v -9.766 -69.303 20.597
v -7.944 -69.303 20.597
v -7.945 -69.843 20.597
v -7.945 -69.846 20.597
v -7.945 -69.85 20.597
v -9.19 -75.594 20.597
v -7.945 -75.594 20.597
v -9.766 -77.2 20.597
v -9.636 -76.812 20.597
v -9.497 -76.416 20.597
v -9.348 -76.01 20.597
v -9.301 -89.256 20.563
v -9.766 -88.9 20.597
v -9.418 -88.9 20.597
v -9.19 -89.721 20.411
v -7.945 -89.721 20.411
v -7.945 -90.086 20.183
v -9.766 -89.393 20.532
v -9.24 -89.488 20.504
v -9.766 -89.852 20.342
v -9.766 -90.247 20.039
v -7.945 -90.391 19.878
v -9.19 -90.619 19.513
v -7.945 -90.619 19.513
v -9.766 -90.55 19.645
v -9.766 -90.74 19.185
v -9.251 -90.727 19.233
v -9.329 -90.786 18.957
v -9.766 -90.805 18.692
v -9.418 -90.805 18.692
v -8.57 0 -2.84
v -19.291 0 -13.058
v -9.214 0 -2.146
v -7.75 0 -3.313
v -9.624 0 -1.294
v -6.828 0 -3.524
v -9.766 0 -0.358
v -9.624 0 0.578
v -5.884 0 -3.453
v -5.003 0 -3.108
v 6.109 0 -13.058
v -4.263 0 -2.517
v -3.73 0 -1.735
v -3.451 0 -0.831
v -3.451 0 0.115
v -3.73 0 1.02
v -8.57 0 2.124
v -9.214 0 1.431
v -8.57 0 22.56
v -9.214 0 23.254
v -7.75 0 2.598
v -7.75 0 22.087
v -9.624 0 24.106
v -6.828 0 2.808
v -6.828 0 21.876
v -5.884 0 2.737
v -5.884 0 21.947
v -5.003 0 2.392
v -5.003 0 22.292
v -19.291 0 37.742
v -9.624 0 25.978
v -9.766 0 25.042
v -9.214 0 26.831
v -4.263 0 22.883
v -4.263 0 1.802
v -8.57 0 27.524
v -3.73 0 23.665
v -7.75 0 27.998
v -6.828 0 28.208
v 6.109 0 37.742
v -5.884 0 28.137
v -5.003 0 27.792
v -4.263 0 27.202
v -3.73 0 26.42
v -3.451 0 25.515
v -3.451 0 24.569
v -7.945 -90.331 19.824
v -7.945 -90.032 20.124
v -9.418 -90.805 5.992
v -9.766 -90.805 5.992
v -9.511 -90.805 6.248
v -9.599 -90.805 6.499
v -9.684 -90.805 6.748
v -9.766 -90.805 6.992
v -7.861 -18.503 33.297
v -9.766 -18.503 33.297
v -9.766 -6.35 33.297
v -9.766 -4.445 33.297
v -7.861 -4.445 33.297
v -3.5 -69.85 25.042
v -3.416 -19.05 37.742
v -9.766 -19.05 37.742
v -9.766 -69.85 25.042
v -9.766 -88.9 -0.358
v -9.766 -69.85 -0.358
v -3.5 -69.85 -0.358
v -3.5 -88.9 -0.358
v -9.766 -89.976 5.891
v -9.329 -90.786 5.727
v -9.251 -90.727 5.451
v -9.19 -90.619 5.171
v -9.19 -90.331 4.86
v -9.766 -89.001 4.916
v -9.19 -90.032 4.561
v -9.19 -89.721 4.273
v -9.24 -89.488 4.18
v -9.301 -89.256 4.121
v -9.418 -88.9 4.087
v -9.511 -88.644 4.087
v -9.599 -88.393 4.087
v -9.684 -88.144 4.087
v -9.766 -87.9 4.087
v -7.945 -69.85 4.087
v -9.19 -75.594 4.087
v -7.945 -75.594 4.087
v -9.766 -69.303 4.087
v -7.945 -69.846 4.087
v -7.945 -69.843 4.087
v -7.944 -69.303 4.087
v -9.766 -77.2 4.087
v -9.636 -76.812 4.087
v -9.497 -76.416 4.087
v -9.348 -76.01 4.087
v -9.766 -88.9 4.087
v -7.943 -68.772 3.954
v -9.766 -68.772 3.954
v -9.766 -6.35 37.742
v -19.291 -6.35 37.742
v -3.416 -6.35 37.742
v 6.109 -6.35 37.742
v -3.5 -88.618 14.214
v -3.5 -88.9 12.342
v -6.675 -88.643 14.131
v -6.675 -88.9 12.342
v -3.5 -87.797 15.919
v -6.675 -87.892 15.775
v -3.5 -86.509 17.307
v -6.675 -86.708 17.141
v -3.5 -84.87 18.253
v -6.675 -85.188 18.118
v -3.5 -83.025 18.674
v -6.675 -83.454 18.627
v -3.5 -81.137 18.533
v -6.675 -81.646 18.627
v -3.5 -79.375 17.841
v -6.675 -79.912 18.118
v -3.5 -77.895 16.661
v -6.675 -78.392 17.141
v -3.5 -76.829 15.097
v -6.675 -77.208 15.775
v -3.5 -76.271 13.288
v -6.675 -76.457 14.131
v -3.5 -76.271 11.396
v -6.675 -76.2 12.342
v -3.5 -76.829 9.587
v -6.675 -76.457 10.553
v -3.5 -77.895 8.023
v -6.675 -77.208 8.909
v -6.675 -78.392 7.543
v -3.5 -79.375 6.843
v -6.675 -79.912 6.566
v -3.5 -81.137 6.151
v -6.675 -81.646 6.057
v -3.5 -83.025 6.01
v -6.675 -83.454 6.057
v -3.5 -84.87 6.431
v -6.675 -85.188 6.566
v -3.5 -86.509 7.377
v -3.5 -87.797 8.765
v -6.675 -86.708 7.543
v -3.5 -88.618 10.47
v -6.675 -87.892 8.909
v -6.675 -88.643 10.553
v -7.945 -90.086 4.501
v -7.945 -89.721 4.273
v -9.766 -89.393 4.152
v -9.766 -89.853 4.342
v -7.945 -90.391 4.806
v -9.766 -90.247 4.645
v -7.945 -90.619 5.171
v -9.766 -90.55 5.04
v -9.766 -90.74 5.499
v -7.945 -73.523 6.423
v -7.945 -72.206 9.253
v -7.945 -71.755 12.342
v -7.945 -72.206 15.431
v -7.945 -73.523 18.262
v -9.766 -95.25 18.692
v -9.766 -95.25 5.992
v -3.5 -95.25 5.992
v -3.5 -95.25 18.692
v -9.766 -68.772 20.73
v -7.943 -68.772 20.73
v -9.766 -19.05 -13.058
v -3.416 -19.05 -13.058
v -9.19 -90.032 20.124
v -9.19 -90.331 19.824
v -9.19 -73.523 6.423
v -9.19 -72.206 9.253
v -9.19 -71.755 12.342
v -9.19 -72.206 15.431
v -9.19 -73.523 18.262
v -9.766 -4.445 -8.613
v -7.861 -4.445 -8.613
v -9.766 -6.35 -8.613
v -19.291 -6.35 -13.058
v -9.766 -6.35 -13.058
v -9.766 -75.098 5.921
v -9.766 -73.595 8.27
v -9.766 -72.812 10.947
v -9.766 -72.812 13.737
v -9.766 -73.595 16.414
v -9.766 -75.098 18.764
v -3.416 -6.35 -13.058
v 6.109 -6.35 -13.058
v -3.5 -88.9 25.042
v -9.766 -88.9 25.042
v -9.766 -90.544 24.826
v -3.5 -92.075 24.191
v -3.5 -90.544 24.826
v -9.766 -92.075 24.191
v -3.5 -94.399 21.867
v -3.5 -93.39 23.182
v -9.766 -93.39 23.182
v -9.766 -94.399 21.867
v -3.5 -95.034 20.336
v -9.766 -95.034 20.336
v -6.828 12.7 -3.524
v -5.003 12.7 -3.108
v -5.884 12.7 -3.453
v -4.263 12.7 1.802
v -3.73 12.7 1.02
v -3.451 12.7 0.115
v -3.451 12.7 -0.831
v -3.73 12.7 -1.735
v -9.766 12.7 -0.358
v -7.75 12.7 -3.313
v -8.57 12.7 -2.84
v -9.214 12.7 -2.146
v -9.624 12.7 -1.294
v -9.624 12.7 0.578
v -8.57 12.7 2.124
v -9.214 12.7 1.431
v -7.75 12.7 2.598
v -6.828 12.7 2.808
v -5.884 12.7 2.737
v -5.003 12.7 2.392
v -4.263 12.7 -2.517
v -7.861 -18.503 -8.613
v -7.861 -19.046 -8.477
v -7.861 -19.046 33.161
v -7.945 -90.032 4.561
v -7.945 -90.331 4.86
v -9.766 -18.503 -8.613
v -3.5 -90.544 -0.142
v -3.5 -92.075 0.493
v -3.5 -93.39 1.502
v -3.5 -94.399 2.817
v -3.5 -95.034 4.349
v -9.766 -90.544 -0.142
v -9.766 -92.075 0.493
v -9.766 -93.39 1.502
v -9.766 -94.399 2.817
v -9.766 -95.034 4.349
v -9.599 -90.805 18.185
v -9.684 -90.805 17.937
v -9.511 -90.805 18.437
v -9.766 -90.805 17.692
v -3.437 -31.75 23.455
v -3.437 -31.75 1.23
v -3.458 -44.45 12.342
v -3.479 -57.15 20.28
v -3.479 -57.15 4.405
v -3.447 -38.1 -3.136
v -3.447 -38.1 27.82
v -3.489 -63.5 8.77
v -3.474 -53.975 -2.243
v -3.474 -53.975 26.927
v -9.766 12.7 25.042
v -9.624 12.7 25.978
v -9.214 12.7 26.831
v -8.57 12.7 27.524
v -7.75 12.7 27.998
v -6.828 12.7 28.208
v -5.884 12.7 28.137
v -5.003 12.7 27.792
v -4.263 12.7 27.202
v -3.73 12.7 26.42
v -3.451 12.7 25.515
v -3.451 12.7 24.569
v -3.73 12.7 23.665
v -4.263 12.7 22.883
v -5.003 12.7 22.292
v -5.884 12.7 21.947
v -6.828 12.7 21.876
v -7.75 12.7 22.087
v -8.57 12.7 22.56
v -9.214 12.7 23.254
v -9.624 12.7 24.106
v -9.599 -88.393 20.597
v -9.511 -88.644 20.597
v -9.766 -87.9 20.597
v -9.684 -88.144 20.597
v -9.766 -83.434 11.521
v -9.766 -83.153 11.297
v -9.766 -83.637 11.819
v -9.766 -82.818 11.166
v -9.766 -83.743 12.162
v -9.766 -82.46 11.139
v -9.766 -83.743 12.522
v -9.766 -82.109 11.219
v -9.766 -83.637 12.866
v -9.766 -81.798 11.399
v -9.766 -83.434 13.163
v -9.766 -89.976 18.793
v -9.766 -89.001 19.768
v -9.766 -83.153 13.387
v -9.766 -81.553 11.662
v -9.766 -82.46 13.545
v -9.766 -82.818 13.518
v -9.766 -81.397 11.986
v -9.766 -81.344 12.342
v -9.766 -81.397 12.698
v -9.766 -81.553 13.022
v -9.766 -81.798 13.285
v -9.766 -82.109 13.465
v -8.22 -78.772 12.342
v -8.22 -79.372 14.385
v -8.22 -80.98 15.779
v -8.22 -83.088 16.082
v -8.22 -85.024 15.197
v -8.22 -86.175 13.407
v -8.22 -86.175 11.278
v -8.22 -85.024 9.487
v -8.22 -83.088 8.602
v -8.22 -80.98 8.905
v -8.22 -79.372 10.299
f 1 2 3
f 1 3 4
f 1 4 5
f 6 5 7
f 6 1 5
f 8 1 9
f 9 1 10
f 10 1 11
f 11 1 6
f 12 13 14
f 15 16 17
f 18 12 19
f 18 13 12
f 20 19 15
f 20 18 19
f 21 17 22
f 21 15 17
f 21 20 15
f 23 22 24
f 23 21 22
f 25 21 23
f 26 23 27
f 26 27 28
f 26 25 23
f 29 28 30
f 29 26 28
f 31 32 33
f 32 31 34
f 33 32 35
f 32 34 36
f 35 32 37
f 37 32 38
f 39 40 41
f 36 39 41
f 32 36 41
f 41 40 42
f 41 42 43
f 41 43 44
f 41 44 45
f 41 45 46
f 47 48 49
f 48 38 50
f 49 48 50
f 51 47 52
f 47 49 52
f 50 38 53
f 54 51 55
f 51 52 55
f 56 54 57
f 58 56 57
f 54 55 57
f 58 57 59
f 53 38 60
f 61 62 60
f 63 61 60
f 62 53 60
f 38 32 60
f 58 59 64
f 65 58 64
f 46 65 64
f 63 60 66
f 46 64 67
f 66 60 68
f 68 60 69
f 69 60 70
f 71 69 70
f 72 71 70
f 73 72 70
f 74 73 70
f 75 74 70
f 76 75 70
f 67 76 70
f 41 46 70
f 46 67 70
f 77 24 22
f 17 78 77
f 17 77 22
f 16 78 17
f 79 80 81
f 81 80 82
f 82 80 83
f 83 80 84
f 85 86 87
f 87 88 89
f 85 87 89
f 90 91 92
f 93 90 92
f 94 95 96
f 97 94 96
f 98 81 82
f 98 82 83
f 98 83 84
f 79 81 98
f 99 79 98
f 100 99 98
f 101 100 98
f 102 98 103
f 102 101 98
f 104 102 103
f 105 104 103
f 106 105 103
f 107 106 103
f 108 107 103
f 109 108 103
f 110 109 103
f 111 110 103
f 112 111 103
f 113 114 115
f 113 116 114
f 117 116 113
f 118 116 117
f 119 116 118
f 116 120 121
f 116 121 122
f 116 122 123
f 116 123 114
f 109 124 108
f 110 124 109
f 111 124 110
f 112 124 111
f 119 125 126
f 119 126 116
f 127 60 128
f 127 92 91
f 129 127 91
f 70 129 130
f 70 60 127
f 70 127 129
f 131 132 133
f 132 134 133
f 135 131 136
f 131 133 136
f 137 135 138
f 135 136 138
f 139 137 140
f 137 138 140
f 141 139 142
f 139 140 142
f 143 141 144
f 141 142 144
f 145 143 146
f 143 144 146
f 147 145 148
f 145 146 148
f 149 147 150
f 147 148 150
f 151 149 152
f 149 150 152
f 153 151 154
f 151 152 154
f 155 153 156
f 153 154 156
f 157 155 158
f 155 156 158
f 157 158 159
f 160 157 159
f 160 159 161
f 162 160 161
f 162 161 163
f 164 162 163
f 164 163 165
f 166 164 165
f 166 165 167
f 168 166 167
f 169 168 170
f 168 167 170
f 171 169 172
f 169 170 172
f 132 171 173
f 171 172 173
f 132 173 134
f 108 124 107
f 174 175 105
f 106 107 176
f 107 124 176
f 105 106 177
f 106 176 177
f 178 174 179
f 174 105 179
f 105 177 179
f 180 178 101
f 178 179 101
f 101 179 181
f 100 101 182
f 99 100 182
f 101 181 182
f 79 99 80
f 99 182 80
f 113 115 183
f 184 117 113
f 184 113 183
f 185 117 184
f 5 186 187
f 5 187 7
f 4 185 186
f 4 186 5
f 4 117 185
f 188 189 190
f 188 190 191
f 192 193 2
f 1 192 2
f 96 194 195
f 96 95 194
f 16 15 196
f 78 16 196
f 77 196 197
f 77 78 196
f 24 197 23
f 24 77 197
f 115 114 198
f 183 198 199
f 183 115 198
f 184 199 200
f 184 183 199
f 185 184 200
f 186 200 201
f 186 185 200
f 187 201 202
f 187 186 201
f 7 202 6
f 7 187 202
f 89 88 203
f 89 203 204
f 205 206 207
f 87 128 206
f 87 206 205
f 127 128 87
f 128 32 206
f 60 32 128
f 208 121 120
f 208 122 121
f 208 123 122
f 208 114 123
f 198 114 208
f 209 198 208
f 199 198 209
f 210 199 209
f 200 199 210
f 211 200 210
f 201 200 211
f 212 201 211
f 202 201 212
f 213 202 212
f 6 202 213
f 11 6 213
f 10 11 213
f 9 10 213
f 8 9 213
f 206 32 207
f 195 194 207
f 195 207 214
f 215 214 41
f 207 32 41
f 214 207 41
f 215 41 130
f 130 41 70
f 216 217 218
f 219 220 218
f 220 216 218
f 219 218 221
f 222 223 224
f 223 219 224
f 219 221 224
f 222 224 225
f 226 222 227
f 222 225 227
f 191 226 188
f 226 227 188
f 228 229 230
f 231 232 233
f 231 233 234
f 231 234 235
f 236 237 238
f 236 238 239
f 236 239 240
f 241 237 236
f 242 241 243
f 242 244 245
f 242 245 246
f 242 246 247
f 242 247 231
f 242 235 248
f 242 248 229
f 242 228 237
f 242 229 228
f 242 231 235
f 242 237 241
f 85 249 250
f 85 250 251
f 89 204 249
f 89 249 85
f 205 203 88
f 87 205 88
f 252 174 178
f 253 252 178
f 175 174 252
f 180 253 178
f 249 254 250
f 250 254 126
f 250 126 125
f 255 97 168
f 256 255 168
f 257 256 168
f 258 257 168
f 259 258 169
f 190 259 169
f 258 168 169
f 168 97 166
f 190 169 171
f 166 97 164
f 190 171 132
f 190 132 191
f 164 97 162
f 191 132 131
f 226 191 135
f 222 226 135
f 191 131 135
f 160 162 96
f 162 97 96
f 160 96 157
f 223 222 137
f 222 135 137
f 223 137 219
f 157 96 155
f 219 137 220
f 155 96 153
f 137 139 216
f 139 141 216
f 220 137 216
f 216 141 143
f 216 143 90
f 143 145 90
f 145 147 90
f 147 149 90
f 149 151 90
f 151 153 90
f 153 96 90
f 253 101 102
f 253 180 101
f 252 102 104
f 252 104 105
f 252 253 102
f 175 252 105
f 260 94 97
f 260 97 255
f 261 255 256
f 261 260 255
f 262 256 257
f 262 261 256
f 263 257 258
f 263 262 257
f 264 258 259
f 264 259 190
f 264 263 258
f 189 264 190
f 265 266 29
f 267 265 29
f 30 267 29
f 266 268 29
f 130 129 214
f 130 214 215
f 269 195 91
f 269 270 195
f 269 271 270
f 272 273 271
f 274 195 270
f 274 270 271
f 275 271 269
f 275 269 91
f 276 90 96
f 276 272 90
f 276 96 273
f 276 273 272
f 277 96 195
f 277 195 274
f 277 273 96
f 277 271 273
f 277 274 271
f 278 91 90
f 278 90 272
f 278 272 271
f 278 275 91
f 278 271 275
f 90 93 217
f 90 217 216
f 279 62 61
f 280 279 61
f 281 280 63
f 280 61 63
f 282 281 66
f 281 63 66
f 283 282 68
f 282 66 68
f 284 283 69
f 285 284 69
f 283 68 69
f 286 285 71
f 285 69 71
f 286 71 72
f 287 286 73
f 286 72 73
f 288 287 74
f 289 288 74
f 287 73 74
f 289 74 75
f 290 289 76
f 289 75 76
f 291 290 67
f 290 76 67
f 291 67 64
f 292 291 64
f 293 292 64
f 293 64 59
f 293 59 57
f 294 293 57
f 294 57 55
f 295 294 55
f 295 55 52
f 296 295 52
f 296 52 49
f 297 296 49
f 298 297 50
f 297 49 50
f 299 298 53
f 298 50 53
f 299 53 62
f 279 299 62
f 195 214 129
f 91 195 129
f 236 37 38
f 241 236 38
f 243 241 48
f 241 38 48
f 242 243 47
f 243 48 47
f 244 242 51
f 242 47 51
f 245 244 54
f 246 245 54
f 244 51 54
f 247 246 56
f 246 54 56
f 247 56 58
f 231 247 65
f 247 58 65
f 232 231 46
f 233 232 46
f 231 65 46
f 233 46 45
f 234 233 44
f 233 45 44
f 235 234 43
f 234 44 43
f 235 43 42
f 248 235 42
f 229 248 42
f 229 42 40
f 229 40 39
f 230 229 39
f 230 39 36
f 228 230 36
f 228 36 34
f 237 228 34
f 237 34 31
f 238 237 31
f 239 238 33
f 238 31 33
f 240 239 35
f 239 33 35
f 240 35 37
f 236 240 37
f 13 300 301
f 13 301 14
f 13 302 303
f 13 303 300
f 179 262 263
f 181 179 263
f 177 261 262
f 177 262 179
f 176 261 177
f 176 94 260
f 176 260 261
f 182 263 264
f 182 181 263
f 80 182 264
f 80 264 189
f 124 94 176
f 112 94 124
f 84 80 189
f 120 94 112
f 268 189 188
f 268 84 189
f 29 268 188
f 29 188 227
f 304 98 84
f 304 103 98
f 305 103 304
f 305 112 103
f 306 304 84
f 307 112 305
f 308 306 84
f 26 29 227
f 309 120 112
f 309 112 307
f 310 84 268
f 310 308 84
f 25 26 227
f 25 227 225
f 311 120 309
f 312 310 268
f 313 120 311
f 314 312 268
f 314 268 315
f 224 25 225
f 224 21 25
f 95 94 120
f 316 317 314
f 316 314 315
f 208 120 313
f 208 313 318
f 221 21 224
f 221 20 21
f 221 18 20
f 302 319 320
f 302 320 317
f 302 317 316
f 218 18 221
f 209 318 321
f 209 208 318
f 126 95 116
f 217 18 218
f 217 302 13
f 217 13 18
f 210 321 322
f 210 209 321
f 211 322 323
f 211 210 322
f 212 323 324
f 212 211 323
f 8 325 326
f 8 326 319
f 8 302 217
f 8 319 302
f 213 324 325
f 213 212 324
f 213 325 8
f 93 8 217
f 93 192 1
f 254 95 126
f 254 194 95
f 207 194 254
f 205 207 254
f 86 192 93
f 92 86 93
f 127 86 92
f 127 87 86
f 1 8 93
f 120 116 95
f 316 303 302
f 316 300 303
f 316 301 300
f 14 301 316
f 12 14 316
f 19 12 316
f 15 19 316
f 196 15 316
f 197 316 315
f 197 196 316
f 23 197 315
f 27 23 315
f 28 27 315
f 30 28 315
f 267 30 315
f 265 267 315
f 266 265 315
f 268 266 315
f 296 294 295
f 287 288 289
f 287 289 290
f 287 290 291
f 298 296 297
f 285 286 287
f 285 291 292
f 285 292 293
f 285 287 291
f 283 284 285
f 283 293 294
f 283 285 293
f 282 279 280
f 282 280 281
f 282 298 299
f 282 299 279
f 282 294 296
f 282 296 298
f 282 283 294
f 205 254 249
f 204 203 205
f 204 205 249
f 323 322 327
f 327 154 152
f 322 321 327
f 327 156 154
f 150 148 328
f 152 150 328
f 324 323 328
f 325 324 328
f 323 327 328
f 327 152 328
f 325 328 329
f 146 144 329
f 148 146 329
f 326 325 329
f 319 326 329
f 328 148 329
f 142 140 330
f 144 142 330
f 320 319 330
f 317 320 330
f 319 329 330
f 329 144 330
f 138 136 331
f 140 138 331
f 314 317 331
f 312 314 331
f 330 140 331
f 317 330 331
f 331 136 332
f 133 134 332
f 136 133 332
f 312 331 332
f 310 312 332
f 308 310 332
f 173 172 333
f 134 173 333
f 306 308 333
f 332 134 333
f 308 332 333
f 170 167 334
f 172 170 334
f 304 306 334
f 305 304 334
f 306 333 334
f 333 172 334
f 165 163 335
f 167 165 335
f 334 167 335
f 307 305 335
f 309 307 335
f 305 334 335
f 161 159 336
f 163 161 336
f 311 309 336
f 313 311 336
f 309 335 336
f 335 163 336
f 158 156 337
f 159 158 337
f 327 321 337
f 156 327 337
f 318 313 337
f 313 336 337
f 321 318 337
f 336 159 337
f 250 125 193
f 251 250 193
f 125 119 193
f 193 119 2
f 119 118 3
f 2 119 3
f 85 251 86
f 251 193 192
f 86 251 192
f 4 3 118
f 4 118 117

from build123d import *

# Parameters (mm, degrees)
F0_W         = 25.4
F0_H         = 50.8
F1_DEPTH     = 6.35
F2_W         = 6.35
F2_H         = 50.8
F3_DEPTH     = 12.7
F3_FACE_W    = 6.35
F3_FACE_H    = 50.8
F5_W         = 6.2655590393
F5_H         = 25.4
F7_DEPTH     = 25.4
F8_T1_DEPTH  = 38.0155590393
F10_D        = 12.7
F10_DEPTH    = 3.175
F10_TIP      = 3.8154649308
F11_T        = 4.445
F11_T3_DEPTH = 59.69
F11_T5_DEPTH = 15.1555590393
F11_T7_DEPTH = 34.29
F12_R        = 3.175
F13_DEPTH    = 12.7


# Not quite as in the source:
# - a fillet or chamfer that OpenCascade refuses, or shapes differently, is made with other operations: its cross-section is extruded or revolved along the edge and cut away or added
# - a shell that OpenCascade refuses in one call is made with other operations: the cavity is built on its own and cut out


with BuildPart() as f1:
    # F0 (on Front) → F1 (new body)
    with BuildSketch(Plane.XZ):
        with Locations((-6.5905367956, 12.3420813114)):
            Rectangle(F0_W, F0_H)
    extrude(amount=F1_DEPTH)

    # F2 (on face) → F3 (join)
    with BuildSketch(Plane.XZ.offset(6.35)):
        with Locations((-6.5905367956, 12.3420813114)):
            Rectangle(F2_W, F2_H)
    extrude(amount=F3_DEPTH)

    # F3_face (on face) → F6 section 0
    with BuildSketch(Plane(origin=(-6.5905367956, -19.05, 12.3420813114), x_dir=(1, 0, 0), z_dir=(0, -1, 0))):
        Rectangle(F3_FACE_W, F3_FACE_H)
    # F5 (on offset) → F6 section 1
    with BuildSketch(Plane.XZ.offset(69.85)):
        with Locations((-6.6327572759, 12.3420813114)):
            Rectangle(F5_W, F5_H)
    loft()

    # F7 (add): a face of the model
    f7_faces = [f1.faces().sort_by_distance(p)[0] for p in [
        (-6.6327572759, -69.85, 12.3420813114),
    ]]
    extrude(f7_faces, amount=F7_DEPTH)

    # F8: fillet of radius 6.35 on 4 edges, made by hand

    # F8_s2 → F8_t1 (cut)
    with BuildSketch(Plane.YZ.offset(-25.6405367956)):
        with BuildLine():
            ThreePointArc((-88.9, 25.0420813114), (-93.3901280605, 23.1822093719), (-95.25, 18.6920813114))
            Line((-95.25, 18.6920813114), (-95.25, 25.0420813114))
            Line((-95.25, 25.0420813114), (-88.9, 25.0420813114))
        make_face()
        with BuildLine():
            ThreePointArc((-88.9, -0.3579186886), (-93.3901280605, 1.5019532508), (-95.25, 5.9920813114))
            Line((-95.25, 5.9920813114), (-95.25, -0.3579186886))
            Line((-95.25, -0.3579186886), (-88.9, -0.3579186886))
        make_face()
    extrude(amount=F8_T1_DEPTH, mode=Mode.SUBTRACT)

    # F10
    with Locations(Plane.YZ.offset(-3.4999777563)):
        with Locations((-82.55, 12.3420813114)):
            Hole(F10_D / 2, depth=F10_DEPTH)
            with Locations((0, 0, -(F10_DEPTH + F10_TIP / 2))):  # 118° drill point
                Cone(0, F10_D / 2, F10_TIP, mode=Mode.SUBTRACT)

    # F11: shell of thickness 4.445, made by hand


with BuildPart() as f11_core1:
    # F11_t2: copy of F1
    add(f1.part)

    # the walls: a layer under each face that stays
    f11_faces = [f11_core1.faces().sort_by_distance(p)[0] for p in [
        (-19.2905367956, -3.175, 12.3420813114),
        (-6.5905367956, -9.525, 37.7420813114),
        (-6.5905367956, -9.525, -13.0579186886),
        (-6.5905367956, 0, 12.3420813114),
        (-14.5280367956, -6.35, 12.3420813114),
        (6.1094632044, -3.175, 12.3420813114),
        (1.3469632044, -6.35, 12.3420813114),
        (-3.4155367956, -12.7, 12.3420813114),
        (-6.6116470357, -44.45, 31.3920813114),
        (-6.6116470357, -44.45, -6.7079186886),
        (-3.4577572759, -44.45, 12.3420813114),
        (-6.6327572759, -79.375, 25.0420813114),
        (-6.6327572759, -79.375, -0.3579186886),
        (-6.6327572759, -93.3901280605, 23.1822093719),
        (-6.6327572759, -93.3901280606, 1.5019532508),
        (-6.6327572759, -95.25, 12.3420813114),
        (-8.2202572759, -86.328223001, 12.3420813114),
        (-3.4999777563, -91.0166666667, 3.8754146447),
        (-5.0874777563, -88.9, 12.3420813114),
    ]]
    thicken(f11_faces, amount=-F11_T, mode=Mode.SUBTRACT)

    # F11_s4 → F11_t3 (cut)
    with BuildSketch(Plane.XY.offset(-17.5029186886)):
        Polygon((-3.3710867956, -6.39445), (-3.4155367956, -1.905), (-7.8605367956, -1.905), (-7.8605367956, -6.35), align=None)
    extrude(amount=F11_T3_DEPTH, mode=Mode.SUBTRACT)

    # F11_s6 → F11_t5 (cut)
    with BuildSketch(Plane.YZ.offset(-14.2105367956)):
        Polygon((-69.8607807085, 25.1296541455), (-68.7719291467, 20.7297978982), (-69.3027954941, 20.5970813114), (-69.85, 20.5970813114), align=None)
        Polygon((-69.8607807085, -0.4454915228), (-68.7719291467, 3.9543647245), (-69.3027954941, 4.0870813114), (-69.85, 4.0870813114), align=None)
    extrude(amount=F11_T5_DEPTH, mode=Mode.SUBTRACT)

    # F11_s8 → F11_t7 (cut)
    with BuildSketch(Plane.XY.offset(-4.8029186886)):
        Polygon((-3.4110778177, -69.8500738857), (-7.9449716156, -69.8426114261), (-7.9449777563, -69.8463057105), (-7.9449777563, -69.85), align=None)
    extrude(amount=F11_T7_DEPTH, mode=Mode.SUBTRACT)

    # F11_s9 → F11_t10 (revolve, cut)
    with BuildSketch(Plane.XY.offset(12.3420813114)):
        Polygon((-6.6368766698, -76.2673434424), (-10.4850864079, -73.910655757), (-9.1898377553, -71.755), (-6.6749777563, -71.755), align=None)
    revolve(axis=Axis((-6.6749777563, -82.55, 12.3420813114), (1, 0, 0)), mode=Mode.SUBTRACT)


with BuildPart() as f1_1:
    add(f1.part)

    # what is left inside the walls is the cavity
    f11_cavity = [f11_core1.part.solids().sort_by_distance(p)[0] for p in [
        (-9.721087, -28.696773, 12.342081),
        (-9.611738, -89.747742, 5.14434),
        (-9.611738, -89.747742, 19.539823),
    ]]
    add(f11_cavity, mode=Mode.SUBTRACT)

    # F12 (on face) → F13 (join)
    with BuildSketch(Plane(origin=(0, 0, 0), x_dir=(-1, 0, 0), z_dir=(0, 1, 0))):
        with Locations((6.5905367956, 25.0420813114)):
            Circle(F12_R)
        with Locations((6.5905367956, -0.3579186886)):
            Circle(F12_R)
    extrude(amount=F13_DEPTH)


solid = f1_1.part
